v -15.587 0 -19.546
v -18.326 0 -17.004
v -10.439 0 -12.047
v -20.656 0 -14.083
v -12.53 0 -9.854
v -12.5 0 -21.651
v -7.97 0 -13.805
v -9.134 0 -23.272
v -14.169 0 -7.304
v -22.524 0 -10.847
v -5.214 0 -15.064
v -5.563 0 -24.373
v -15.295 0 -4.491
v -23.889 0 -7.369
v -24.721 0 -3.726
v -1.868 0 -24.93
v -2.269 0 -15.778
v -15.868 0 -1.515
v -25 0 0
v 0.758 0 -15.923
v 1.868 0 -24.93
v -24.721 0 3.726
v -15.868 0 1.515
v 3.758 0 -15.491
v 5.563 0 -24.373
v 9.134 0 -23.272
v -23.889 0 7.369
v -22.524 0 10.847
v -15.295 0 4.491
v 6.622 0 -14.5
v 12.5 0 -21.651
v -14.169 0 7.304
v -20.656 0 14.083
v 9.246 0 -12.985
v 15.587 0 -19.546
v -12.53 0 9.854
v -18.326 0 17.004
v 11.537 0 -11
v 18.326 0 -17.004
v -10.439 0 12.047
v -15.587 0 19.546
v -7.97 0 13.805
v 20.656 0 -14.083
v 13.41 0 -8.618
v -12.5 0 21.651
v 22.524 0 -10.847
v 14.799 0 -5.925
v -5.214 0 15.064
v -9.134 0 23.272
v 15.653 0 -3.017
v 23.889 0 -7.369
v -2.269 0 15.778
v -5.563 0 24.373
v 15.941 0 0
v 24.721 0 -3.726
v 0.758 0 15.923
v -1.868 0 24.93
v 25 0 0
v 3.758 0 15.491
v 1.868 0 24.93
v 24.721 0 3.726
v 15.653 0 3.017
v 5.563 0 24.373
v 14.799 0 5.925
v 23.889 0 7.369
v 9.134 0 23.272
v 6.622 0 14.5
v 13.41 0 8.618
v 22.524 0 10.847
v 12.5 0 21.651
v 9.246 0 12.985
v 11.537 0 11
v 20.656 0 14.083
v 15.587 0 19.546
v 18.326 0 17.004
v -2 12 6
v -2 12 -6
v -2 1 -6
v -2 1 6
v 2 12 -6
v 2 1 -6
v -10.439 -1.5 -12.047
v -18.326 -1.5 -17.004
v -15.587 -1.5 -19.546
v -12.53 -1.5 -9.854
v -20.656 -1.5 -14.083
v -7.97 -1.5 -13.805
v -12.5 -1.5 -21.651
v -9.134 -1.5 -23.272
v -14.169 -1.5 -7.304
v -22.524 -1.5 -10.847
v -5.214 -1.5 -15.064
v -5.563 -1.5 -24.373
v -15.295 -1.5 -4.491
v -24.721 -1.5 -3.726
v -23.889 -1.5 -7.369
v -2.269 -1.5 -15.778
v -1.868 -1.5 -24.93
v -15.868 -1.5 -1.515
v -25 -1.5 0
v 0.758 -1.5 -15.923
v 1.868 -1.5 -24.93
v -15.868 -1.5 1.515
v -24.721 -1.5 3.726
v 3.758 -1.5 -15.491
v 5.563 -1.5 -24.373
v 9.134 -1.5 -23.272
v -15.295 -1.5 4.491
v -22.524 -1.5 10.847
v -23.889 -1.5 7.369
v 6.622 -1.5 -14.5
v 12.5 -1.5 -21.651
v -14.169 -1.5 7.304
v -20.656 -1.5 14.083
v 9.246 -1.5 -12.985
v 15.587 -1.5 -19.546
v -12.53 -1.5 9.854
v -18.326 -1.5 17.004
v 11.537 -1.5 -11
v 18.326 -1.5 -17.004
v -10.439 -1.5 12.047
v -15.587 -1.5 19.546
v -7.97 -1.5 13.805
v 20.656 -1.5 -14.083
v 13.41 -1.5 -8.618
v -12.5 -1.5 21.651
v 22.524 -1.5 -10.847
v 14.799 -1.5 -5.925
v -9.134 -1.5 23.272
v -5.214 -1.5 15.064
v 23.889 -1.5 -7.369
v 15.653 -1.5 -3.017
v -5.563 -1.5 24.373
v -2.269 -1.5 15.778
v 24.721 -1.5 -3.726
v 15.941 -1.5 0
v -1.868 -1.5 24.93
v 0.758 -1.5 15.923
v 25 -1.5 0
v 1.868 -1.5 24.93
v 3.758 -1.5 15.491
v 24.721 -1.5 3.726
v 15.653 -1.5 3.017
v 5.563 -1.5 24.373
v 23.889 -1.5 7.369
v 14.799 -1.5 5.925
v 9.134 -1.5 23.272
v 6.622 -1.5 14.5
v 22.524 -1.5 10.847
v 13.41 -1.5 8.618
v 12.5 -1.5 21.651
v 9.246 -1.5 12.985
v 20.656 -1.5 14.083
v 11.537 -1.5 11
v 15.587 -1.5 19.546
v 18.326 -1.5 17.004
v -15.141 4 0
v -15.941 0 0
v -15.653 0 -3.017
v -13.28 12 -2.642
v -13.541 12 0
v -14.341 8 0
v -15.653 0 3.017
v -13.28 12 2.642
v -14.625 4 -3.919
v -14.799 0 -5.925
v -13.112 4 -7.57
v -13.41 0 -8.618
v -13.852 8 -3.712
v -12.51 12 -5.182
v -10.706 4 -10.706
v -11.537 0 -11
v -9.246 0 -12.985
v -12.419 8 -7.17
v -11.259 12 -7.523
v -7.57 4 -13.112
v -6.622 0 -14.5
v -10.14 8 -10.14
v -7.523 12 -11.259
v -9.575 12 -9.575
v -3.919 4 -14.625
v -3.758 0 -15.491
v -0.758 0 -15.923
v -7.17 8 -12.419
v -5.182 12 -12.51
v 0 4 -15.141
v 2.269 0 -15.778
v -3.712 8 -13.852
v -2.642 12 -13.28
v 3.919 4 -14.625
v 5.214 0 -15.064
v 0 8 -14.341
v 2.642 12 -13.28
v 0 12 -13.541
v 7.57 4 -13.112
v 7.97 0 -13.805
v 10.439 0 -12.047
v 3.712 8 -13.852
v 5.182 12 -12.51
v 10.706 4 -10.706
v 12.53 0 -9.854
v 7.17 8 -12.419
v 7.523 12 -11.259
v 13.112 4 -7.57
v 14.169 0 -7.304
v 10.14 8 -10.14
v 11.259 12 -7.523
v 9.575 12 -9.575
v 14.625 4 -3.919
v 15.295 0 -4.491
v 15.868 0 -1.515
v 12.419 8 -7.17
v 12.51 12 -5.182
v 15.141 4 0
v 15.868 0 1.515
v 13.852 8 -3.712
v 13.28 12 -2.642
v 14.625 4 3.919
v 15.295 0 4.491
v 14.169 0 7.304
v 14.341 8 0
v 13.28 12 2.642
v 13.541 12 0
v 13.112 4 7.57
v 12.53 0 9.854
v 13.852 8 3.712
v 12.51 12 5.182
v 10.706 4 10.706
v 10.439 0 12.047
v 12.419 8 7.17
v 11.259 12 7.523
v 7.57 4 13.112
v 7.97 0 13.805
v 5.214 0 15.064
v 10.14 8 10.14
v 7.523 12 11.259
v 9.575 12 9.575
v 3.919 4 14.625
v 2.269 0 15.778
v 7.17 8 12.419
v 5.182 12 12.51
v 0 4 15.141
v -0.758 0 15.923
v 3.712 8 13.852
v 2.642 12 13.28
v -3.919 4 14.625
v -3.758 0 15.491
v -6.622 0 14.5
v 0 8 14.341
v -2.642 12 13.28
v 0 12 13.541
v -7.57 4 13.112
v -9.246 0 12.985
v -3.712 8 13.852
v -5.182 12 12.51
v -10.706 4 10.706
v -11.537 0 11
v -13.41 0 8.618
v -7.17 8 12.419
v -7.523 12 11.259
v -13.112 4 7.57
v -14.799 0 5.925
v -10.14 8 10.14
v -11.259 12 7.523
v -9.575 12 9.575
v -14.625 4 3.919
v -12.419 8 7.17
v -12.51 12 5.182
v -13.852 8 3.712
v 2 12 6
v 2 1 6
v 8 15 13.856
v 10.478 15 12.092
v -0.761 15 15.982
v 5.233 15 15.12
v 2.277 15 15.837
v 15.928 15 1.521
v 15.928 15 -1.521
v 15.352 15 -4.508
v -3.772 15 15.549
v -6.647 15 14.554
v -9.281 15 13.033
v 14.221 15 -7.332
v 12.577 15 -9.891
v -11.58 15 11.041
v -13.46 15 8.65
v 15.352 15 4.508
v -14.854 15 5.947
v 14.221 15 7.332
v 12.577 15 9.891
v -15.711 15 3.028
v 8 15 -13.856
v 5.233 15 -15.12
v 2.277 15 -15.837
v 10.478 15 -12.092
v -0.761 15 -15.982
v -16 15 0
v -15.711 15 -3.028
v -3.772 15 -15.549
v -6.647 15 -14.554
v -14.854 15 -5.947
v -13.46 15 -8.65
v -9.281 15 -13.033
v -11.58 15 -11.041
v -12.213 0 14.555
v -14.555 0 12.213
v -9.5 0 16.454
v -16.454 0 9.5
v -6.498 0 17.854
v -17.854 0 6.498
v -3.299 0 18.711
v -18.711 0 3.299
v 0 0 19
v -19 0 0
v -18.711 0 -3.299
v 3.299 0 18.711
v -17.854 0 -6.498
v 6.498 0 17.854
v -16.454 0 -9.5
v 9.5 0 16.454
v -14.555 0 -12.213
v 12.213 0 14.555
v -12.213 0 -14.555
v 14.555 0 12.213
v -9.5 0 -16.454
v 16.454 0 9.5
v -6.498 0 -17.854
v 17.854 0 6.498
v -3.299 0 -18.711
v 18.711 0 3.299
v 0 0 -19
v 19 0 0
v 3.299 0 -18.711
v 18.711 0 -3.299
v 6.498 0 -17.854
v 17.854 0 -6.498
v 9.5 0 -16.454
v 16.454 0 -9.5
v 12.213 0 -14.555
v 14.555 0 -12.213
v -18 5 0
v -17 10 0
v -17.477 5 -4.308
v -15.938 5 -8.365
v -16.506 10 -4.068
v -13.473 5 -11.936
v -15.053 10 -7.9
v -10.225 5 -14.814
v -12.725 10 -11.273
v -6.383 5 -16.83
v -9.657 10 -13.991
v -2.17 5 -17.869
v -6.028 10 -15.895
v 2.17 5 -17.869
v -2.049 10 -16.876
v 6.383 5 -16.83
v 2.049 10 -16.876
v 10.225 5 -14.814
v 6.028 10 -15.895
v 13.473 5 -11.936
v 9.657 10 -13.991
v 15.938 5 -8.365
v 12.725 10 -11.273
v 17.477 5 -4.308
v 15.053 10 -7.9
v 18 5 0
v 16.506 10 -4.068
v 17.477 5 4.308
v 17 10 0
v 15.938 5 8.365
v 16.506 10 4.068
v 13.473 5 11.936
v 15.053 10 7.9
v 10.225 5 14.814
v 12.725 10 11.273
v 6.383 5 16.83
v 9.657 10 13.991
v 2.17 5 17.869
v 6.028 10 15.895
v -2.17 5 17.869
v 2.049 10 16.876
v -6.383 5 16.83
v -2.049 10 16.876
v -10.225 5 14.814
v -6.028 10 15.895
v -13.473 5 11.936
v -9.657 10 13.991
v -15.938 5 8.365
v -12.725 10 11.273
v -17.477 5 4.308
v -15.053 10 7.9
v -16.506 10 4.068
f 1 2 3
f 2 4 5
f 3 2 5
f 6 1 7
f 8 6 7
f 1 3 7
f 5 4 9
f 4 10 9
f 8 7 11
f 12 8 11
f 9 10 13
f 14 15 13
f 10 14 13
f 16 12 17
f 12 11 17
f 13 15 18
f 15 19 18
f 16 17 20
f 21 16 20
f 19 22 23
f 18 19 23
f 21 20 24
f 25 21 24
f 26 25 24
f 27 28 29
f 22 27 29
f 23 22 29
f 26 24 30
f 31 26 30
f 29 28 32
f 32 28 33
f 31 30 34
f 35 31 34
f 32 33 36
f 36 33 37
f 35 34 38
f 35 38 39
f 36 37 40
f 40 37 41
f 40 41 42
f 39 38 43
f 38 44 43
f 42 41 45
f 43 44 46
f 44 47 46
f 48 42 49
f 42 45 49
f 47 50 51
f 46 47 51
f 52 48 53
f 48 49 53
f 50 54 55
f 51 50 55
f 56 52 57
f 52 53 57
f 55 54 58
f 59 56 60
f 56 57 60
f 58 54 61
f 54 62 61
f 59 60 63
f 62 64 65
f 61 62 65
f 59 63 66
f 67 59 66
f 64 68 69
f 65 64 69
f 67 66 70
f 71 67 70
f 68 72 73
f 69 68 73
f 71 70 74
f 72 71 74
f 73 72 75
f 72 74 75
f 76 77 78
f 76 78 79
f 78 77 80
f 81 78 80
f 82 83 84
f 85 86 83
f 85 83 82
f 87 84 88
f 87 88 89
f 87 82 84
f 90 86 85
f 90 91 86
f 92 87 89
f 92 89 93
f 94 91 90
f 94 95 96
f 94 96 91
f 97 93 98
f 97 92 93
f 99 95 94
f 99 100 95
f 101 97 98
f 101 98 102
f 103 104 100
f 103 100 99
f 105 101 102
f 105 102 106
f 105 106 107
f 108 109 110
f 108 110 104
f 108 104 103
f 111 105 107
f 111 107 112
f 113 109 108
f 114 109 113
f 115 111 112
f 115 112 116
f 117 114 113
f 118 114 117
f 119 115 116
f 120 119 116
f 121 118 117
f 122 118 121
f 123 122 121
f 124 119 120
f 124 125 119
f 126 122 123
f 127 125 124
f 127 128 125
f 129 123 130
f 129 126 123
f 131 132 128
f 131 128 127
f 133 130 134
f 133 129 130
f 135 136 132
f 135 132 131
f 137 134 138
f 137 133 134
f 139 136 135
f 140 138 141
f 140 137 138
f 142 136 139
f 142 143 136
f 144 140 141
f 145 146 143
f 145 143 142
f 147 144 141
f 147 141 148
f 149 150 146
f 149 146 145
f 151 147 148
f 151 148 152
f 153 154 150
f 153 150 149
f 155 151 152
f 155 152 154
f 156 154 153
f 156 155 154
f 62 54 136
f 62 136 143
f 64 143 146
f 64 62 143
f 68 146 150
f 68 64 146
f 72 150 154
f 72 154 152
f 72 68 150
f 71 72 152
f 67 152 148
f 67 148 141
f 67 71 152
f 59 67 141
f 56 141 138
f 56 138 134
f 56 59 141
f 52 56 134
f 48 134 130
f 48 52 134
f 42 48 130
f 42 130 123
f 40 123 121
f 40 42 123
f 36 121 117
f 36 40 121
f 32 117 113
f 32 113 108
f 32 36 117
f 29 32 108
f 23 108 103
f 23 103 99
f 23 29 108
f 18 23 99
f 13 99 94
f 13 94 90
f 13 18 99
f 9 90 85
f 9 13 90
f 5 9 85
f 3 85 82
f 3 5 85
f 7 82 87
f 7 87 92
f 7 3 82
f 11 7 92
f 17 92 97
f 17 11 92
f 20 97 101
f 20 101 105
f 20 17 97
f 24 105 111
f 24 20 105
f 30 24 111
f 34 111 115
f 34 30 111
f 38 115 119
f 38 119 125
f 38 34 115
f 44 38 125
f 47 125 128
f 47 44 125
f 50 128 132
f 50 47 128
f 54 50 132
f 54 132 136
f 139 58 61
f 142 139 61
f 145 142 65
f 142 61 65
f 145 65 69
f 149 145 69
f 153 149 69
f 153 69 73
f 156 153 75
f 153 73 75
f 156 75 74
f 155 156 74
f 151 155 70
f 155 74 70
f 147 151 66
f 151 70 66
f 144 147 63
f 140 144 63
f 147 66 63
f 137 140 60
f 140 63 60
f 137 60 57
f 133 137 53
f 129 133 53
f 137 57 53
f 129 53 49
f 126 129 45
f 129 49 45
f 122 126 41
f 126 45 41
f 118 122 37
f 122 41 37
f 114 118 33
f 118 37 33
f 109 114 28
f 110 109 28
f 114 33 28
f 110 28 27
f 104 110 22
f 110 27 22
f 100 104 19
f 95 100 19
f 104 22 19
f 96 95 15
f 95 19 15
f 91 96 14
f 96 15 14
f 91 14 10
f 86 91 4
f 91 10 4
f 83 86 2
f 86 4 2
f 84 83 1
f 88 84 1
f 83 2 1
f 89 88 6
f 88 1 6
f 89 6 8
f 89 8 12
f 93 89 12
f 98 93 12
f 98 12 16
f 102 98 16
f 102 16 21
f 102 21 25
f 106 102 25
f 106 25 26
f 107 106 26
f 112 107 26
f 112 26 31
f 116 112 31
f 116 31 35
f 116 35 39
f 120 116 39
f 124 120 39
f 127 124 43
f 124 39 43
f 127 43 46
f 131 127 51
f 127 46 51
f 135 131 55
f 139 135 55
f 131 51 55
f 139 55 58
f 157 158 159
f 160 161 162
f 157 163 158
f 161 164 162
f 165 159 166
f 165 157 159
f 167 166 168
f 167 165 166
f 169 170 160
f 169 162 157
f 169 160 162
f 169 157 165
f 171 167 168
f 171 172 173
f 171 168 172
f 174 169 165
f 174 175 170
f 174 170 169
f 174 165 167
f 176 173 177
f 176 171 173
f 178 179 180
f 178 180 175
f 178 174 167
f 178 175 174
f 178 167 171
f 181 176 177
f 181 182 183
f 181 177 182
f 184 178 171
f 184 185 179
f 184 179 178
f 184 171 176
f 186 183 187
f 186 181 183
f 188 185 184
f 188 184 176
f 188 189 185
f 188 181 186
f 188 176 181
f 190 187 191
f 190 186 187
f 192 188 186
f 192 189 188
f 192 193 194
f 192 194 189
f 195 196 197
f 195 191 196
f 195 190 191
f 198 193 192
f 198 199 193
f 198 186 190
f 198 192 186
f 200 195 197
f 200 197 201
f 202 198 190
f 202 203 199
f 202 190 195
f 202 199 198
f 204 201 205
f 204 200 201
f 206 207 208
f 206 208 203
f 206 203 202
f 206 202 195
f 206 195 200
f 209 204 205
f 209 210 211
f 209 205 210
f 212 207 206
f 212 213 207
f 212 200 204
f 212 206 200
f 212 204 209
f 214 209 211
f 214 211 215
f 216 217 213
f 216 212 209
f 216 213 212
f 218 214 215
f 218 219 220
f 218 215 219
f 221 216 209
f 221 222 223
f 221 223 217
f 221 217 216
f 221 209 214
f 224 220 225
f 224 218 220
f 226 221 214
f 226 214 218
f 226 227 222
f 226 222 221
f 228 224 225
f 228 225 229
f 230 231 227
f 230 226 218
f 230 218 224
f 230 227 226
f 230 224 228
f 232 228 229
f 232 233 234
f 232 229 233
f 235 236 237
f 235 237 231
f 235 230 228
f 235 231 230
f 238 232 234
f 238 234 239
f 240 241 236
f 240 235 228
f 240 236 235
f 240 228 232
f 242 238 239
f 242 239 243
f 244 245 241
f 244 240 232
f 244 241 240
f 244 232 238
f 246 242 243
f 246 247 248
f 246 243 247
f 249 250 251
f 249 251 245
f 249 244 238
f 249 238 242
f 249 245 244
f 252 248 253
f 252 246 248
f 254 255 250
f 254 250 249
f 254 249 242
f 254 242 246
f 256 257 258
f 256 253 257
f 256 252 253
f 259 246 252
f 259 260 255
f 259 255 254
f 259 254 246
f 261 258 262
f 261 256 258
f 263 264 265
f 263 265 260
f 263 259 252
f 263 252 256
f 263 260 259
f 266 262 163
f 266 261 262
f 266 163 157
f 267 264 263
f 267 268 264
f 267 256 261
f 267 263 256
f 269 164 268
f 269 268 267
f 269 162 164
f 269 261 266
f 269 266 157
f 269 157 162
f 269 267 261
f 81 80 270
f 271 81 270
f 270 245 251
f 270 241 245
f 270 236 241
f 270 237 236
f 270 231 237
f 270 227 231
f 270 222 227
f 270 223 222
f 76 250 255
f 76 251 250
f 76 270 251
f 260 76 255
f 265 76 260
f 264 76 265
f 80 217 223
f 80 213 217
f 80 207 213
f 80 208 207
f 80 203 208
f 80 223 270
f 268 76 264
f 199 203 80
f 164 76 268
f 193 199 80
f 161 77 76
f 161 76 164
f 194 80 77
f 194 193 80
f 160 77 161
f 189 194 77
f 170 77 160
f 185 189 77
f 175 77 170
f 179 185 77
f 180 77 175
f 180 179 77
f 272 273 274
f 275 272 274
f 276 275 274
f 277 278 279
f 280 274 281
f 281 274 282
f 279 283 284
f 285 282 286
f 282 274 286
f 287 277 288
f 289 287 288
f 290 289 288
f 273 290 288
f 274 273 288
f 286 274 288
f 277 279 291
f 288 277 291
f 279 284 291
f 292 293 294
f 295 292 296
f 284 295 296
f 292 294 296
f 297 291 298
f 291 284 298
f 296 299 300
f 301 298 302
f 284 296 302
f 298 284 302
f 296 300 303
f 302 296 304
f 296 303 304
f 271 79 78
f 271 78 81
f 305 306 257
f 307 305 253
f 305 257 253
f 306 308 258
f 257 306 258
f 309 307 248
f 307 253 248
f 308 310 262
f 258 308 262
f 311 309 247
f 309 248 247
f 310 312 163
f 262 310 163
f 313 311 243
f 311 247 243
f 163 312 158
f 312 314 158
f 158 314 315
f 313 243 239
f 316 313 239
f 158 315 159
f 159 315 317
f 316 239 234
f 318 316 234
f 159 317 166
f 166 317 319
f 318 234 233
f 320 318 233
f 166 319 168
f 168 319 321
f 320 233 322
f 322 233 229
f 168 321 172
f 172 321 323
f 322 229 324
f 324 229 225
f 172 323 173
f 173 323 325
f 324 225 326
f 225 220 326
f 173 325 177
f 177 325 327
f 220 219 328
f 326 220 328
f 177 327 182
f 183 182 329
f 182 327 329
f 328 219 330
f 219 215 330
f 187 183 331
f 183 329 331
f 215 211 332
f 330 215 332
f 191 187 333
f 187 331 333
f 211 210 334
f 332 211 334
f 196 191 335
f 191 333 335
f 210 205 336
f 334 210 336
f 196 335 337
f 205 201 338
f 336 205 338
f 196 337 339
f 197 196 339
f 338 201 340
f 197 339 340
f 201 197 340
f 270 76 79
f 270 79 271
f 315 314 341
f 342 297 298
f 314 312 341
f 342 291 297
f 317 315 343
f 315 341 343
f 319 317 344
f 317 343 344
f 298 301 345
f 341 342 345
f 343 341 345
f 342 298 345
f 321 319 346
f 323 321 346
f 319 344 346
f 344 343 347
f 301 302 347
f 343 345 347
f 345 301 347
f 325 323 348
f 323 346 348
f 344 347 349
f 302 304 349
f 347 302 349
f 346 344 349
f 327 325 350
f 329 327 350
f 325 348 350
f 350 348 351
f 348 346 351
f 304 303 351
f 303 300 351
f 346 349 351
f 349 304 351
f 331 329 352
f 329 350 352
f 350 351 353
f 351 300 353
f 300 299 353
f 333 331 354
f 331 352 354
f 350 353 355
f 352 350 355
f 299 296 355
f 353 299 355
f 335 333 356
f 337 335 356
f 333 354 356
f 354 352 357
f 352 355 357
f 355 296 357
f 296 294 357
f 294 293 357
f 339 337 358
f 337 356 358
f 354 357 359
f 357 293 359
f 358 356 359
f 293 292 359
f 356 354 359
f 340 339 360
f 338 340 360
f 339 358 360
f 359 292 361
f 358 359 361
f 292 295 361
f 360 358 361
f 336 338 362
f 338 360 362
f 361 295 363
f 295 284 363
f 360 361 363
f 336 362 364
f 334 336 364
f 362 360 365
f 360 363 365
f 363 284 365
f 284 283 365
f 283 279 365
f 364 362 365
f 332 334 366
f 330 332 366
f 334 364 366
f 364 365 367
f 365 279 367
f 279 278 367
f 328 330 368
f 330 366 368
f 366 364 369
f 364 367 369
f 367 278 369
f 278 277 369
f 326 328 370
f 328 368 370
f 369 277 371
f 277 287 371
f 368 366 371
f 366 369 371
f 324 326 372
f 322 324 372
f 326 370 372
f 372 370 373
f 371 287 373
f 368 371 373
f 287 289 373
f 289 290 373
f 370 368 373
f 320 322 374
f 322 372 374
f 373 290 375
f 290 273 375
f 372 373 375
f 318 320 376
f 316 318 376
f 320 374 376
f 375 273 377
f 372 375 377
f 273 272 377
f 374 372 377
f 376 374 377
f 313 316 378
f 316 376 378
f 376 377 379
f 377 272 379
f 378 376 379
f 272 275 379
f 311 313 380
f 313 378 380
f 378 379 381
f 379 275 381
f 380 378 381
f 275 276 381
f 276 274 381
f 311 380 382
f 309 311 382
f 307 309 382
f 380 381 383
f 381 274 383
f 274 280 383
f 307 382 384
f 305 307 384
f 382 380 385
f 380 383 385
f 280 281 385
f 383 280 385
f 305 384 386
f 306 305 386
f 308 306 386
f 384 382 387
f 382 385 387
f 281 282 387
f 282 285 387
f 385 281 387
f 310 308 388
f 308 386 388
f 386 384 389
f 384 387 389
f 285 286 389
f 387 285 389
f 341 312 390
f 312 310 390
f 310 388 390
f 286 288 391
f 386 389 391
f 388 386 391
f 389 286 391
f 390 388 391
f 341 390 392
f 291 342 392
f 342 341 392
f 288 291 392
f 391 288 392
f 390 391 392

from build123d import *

# Parameters (mm, degrees)
SHELL1_T            = -3
SKETCH2_R           = 25
SKETCH2_R_2         = 15.940588292
BOSS_EXTRUDE1_DEPTH = 1.5
SKETCH5_W           = 4
SKETCH5_H           = 12
BOSS_EXTRUDE3_DEPTH = 11


with BuildPart() as part:
    # Sketch1 → Revolve1 (revolve)
    with BuildSketch(Plane.XY, mode=Mode.PRIVATE) as revolve1_sk:
        Polygon((0, 15), (0, 0), (19, 0), (16, 15), align=None)
    revolve(revolve1_sk.sketch.rotate(Axis((0, 15, 0), (0, -1, 0)), 180), axis=Axis((0, 15, 0), (0, -1, 0)))

    # Shell1
    shell1_openings = [part.faces().sort_by_distance(p)[0] for p in [
        (0, 0, 0),
    ]]
    offset(amount=SHELL1_T, openings=shell1_openings, kind=Kind.INTERSECTION)

    # Sketch5 → Boss-Extrude3 (add)
    with BuildSketch(Plane.XZ.offset(-12)):
        Rectangle(SKETCH5_W, SKETCH5_H)
    extrude(amount=BOSS_EXTRUDE3_DEPTH)


with BuildPart() as body_2:
    # Sketch2 → Boss-Extrude1 (new body)
    with BuildSketch(Plane.XZ):
        Circle(SKETCH2_R)
        Circle(SKETCH2_R_2, mode=Mode.SUBTRACT)
    extrude(amount=BOSS_EXTRUDE1_DEPTH)


solid = Compound([part.part, body_2.part])
